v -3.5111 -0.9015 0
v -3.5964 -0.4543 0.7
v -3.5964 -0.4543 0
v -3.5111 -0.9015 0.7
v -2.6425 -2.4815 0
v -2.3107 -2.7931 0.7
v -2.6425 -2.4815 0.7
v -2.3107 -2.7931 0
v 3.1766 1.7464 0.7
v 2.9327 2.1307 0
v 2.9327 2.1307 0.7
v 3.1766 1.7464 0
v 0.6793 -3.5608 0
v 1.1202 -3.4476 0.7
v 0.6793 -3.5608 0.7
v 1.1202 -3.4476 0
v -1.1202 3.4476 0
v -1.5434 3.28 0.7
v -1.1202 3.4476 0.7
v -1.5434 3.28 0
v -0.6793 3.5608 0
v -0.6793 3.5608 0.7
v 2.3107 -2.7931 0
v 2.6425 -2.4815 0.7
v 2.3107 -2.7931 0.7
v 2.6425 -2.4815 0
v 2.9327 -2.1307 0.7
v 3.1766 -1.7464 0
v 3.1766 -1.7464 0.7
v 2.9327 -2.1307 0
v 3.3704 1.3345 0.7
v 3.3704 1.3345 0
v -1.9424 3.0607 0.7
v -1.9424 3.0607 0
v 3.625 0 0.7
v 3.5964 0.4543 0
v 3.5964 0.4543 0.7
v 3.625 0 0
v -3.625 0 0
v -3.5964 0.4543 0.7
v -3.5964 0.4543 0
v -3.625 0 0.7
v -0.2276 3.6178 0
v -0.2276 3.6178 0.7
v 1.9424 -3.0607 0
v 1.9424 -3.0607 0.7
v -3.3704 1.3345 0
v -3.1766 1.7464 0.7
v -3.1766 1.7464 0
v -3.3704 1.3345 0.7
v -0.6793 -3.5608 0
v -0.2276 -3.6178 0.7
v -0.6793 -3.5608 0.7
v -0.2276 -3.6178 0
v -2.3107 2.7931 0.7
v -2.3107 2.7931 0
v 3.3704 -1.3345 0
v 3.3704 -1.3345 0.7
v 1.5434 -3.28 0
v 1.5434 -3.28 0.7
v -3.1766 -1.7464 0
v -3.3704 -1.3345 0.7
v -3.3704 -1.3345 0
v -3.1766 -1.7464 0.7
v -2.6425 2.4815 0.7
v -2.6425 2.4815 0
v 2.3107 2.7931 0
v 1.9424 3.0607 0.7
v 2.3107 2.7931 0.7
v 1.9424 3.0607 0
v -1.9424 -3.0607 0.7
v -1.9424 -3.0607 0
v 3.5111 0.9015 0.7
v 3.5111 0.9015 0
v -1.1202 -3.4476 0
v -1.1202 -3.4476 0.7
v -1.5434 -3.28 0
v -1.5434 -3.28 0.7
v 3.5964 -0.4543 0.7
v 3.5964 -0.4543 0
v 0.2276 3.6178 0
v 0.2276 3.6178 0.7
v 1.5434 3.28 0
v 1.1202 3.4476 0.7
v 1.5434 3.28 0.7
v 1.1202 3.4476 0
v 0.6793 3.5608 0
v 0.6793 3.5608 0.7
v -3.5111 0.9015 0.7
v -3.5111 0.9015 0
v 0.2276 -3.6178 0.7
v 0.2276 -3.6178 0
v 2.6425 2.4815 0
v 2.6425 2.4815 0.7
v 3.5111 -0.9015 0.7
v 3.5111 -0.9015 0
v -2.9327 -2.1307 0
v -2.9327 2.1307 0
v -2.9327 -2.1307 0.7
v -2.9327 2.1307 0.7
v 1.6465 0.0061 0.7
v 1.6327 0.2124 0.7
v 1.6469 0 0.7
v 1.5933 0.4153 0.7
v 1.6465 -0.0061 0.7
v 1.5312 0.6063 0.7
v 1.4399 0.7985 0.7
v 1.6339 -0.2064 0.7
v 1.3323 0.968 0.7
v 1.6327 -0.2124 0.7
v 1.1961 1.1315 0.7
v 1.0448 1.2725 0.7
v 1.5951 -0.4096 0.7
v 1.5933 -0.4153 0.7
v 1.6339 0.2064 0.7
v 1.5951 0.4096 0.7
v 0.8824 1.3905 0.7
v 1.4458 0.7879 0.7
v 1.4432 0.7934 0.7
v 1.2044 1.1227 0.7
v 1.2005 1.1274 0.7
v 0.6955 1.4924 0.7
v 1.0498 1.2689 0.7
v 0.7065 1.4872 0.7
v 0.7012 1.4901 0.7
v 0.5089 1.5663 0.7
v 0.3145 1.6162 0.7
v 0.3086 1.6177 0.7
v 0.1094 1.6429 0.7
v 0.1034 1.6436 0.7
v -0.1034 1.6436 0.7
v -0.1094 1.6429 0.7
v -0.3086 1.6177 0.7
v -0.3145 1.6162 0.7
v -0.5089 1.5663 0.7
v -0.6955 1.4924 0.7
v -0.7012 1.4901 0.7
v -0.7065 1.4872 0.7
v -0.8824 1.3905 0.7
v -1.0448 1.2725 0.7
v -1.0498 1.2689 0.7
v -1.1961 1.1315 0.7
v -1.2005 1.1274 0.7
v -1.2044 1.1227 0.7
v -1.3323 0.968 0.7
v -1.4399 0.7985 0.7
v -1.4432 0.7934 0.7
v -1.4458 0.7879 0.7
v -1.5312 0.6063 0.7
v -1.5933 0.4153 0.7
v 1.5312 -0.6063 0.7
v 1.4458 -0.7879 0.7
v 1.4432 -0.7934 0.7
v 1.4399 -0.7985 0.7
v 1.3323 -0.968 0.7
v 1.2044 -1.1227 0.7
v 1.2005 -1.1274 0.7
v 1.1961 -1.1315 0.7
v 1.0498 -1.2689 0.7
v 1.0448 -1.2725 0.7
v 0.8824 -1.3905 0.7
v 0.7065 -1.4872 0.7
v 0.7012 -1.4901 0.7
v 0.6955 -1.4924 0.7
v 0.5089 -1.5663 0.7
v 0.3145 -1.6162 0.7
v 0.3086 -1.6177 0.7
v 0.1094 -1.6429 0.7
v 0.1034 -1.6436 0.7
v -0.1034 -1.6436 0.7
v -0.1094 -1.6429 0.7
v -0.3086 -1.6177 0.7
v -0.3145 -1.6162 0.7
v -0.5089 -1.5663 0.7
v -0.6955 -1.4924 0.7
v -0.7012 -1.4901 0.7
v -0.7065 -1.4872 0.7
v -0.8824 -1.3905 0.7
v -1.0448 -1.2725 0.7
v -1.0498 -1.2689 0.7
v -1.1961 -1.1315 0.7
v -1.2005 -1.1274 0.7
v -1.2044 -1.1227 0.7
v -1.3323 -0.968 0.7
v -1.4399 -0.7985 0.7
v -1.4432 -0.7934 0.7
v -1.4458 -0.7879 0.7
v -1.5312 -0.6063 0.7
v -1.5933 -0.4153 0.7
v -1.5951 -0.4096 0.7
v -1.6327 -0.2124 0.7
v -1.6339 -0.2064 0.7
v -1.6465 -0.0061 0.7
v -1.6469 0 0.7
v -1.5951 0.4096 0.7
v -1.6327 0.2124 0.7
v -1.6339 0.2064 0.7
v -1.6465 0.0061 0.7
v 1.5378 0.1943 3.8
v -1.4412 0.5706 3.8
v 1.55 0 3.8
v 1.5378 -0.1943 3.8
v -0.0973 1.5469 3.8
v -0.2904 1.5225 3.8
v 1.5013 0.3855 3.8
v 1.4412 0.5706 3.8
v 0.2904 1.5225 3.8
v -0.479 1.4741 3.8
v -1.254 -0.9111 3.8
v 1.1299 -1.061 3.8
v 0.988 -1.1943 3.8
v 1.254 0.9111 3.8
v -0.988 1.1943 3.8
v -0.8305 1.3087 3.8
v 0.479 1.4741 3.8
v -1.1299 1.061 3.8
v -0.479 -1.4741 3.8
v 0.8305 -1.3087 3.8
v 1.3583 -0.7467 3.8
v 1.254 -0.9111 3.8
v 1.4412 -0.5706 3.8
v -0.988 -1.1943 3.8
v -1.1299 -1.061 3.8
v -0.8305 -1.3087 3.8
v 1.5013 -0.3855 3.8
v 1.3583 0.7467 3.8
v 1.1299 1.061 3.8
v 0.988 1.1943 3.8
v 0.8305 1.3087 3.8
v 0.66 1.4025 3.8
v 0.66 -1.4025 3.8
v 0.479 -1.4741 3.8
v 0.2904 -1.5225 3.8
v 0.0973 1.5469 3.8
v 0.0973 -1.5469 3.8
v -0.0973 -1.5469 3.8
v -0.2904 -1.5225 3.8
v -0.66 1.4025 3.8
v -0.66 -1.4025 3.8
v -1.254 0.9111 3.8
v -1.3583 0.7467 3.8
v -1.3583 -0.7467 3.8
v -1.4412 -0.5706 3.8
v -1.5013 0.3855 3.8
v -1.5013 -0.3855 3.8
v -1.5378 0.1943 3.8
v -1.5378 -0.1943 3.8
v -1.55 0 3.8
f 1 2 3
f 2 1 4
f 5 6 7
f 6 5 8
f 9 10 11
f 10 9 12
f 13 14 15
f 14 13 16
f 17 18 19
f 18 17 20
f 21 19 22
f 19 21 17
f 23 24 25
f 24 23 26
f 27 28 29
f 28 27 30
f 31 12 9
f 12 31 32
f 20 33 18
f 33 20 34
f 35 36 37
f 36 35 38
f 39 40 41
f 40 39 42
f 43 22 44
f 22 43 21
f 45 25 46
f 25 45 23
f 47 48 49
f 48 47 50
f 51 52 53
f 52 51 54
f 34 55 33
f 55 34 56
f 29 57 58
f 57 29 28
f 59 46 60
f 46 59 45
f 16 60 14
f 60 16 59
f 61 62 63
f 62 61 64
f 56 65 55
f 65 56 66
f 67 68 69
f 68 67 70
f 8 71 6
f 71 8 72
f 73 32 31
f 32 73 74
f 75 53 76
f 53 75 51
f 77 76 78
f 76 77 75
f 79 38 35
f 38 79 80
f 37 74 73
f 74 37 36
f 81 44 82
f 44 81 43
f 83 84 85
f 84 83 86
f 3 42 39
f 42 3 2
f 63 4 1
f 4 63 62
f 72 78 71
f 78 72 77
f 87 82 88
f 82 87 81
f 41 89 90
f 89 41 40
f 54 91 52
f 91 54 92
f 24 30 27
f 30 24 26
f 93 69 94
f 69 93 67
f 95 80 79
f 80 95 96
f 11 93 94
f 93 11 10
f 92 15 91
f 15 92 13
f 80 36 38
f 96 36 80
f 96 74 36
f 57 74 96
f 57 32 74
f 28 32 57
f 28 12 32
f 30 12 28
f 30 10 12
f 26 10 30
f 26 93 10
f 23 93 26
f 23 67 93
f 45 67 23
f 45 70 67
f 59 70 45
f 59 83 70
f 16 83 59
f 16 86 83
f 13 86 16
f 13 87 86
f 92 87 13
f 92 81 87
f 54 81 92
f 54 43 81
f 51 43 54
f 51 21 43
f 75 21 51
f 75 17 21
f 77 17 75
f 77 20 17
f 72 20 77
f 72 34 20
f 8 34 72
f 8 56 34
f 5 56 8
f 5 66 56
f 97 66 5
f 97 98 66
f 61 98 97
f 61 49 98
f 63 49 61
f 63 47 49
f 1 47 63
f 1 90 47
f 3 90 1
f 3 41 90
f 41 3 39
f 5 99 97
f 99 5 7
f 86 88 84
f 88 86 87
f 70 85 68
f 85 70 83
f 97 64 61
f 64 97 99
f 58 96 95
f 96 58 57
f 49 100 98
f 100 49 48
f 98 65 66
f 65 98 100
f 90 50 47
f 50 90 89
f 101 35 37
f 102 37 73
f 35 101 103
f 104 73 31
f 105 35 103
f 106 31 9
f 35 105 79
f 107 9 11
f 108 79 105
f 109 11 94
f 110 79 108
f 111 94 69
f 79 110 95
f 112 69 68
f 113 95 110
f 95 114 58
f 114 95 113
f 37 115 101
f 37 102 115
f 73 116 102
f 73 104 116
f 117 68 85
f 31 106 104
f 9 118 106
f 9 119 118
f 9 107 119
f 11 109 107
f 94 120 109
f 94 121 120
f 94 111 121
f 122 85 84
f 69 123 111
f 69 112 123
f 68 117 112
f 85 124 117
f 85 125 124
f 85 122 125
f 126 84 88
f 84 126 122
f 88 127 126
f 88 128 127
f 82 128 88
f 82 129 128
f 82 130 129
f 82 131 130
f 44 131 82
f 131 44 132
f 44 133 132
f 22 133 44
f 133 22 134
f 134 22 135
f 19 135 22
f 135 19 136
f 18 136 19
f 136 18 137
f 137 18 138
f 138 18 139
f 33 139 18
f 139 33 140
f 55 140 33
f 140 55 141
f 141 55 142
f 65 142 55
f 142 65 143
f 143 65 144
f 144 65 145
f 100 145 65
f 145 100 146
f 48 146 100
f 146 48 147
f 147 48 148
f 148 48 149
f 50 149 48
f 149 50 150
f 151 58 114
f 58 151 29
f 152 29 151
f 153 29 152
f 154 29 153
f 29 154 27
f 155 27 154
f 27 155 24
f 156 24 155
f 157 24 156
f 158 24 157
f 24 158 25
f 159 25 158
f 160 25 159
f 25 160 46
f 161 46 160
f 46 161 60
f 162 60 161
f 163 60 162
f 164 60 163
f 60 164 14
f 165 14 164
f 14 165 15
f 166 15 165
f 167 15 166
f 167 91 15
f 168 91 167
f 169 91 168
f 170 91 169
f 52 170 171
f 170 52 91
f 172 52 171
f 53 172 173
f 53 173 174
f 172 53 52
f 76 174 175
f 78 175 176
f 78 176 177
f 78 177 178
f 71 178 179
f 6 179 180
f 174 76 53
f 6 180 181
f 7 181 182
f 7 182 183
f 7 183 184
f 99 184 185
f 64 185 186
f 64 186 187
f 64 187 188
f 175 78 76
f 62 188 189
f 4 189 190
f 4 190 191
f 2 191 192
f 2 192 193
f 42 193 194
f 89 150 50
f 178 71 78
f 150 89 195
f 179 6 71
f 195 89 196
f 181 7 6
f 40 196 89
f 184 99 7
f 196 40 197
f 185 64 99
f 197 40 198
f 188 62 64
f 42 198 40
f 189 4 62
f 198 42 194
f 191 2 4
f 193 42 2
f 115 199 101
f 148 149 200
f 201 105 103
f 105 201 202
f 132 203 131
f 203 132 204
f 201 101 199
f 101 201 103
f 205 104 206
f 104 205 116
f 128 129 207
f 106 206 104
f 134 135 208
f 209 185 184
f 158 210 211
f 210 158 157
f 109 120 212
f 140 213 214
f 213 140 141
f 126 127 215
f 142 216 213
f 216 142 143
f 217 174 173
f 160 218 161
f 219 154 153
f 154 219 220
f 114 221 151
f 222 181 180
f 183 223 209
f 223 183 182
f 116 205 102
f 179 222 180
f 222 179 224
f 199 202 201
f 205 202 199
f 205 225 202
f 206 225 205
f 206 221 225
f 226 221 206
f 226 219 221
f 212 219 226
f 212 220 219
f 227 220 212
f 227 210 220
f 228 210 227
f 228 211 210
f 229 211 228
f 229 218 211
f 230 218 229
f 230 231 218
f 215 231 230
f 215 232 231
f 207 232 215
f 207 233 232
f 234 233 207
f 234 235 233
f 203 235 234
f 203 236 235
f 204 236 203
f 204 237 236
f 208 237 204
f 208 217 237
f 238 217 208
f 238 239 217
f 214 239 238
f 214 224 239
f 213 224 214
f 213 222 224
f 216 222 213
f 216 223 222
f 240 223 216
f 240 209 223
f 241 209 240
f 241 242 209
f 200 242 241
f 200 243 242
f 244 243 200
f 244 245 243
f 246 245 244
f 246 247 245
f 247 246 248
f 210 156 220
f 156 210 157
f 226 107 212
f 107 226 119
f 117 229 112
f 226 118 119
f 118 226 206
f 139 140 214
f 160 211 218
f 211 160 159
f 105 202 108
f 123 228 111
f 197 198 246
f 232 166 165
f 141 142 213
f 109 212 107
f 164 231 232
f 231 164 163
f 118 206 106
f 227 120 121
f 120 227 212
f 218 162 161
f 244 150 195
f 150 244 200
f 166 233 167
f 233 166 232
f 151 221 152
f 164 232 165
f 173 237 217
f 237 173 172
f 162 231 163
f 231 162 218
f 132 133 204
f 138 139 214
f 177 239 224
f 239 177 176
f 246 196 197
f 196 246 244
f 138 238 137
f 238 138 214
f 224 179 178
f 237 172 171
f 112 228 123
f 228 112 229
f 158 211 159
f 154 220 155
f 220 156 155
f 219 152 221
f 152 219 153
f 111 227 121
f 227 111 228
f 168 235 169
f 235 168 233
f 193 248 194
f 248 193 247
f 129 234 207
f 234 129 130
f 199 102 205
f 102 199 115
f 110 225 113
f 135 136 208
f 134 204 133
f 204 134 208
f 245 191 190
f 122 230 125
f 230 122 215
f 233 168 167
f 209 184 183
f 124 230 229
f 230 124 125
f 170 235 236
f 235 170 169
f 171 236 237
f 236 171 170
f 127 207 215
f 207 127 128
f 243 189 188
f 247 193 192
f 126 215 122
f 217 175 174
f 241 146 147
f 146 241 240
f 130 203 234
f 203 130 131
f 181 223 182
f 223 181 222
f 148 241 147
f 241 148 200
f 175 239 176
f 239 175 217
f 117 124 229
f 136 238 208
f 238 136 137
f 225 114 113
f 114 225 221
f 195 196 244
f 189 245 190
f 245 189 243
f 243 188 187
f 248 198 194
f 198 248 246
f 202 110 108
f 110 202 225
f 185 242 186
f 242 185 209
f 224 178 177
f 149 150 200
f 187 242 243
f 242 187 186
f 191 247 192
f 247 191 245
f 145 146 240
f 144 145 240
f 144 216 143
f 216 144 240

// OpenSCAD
// file: lib/common.scad
front = [
    149,
    42,
    5
];

rim = [
    146,
    front.y,
    5
];

module components(i, double) {

    count = double ? 2 : 1;

    translate([front.x/2, front.y/2])
    union() {

        if (double) {
            for (x=[0,1])
            translate([(x-0.5)*72, 0])
            controller(i, t=front.z);
        } else {
            controller(i, t=front.z);
        }
        
        translate([0, 0, front.z])
        union() {
            rim(i, rim);
            wings(i, rim);
        }
    }
}

module __build(double=true) {
    difference() {
        cube(front);
        components(false, double=double);
    }
    components(true, double=double);
}

module rim(i, size, t=1, padding_x=3) {
    if (i) {
        cutout = [size.x - (2*t), size.y - (2*t), size.z];
        difference() {
            translate([size.x/-2, size.y/-2]) cube(size);
            translate([cutout.x/-2, cutout.y/-2]) cube(cutout);
        }
    }

    // Bracket
    bracket = [10, t, 0.1];

    for (x=[0,1])
    mirror([x,0])
    translate([(size.x / 2), (size.y/2)])
    union() {
        translate([-bracket.x-padding_x, -bracket.y , size.z])
        hull() {
             cube(bracket);
             translate([bracket.x,0,0]) rotate([0,270,0]) cube(bracket);
        }   


    }
}

module wings(i, rimsize) {

    screw_r = 2.8/2;
    t = 3;
    wing = [t, 30, 52];
    hole_r = 8;

    if (i) {

        for (x=[0,1])
        mirror([x,0])
        translate([(rimsize.x / 2) - wing.x, (rimsize.y/2) - wing.y ])
        union() {

            difference() {
                hull() {
                    // Ensure square bottom:
                    cube([wing.x, wing.y, wing_r]);

                    wing_r = 10;
                    translate([0, wing_r, wing.z - wing_r])
                    rotate([0,90,0]) 
                    minkowski() {
                        cube([wing.z - (2*wing_r), wing.y - (2*wing_r), t/2]);
                        cylinder(r=wing_r, h=t/2, center=false);
                    }

                }
                union() {
                    // Screw holes
                    rotate([0,270])
                    translate([0, wing.y,-t])
                    for (y=[9.5, 9.5+12])
                    translate([47, -y])
                    cylinder(r=screw_r, h=t);

                    // Filament savers
                    rotate([0,270])
                    hull() {
                        translate([rimsize.z, (wing.y/2) - hole_r, -t])
                        cube([1, hole_r*2, t]);

                        translate([33, wing.y/2,-t])
                        cylinder(r=hole_r, h=t);
                    }

                }
            }
        }
    }
}

module controller(i, t) {
    front_h = 0.5; // Minimum thickness of front plate

    // Component height over PCB:
    oled_h      = 2;
    rotary_h    = 4.7;
    button_h    = 2.75;

    mounts = [59, 29];
    cutout = [66, 36, t];

    insert = [cutout.x, cutout.y, front_h + (rotary_h - oled_h)];

    oled_cutout = [32, 16, insert.z];
    oled_cutout_extra = 3;
    oled_initial_inner_h = 0.5;

    rotary_cutout = [12.5, 12.5, insert.z - front_h];
    rotary_r = 3.75;

    button_r = 3;
    button_rim_r = 4;
    button_rim_h = 1.2;

    mount_r = 3;
    mount_padding_x = ((cutout.x - mounts.x) / 2);
    mount_padding_y = ((cutout.y - mounts.y) / 2);
    mount_h = insert.z + oled_h;

    screw_r = 2.8/2;
    screw_h = mount_h - front_h;

    // Designed upside down
    mirror([0, 1])
    if (!i) {

        translate([cutout.x/-2, cutout.y/-2])
        cube(cutout);

    } else {

        difference() {

            union() {
                color([0.5,0.5,0.5])
                translate([insert.x/-2, insert.y/-2])
                cube(insert);

                // Relative to lower
                color([1,0,0])
                for (x=[0,1]) mirror([x,0])
                for (y=[0,1]) mirror([0,y])
                translate([mounts.x/-2, mounts.y/-2])
                union() {
                    cylinder(r=mount_r, h=mount_h);

                    translate([-mount_padding_x, -mount_padding_y])
                    union() {
                        cube([mount_r + mount_padding_x, mount_padding_y, mount_h]);
                        cube([mount_padding_x, mount_r + mount_padding_y, mount_h]);
                    }
                }
            }

            union() {

                for (x=[0,1]) mirror([x,0])
                for (y=[0,1]) mirror([0,y])
                translate([mounts.x/-2, mounts.y/-2, mount_h - screw_h])
                cylinder(r=screw_r, h=screw_h);

                // Relative to lower 
                translate([mounts.x/-2, mounts.y/-2])
                union() {

                    // OLED window
                    translate([2.5, 9])
                    union() {
                        cube(oled_cutout);

                        hull() {
                            translate([0,0,-oled_initial_inner_h])
                            cube(oled_cutout);

                            translate([-oled_cutout_extra, -oled_cutout_extra])
                            cube([
                                oled_cutout.x + (2*oled_cutout_extra),
                                oled_cutout.y + (2*oled_cutout_extra),
                                0.01
                            ]);

                        }
                    }

                    // Rotary                   
                    translate([50.5, 14.5])
                    union() {
                        cylinder(r=rotary_r, h=insert.z);
                        translate([rotary_cutout.x/-2, rotary_cutout.y/-2, front_h])
                        cube(rotary_cutout);

                        // Buttons
                        for (y=[0,1])
                        mirror([0, y])
                        translate([0, 12])
                        union() {
                            cylinder(r=button_r, h=insert.z);

                            translate([0,0, insert.z])
                            rotate([0,180,0])
                            cylinder(r=button_rim_r, h=button_rim_h + (button_h - oled_h) );

                        }
                    }


                }
            }

        }
       
    }
}
// main file
// Birdfeeder-thing
// By Hans Christian Saustrup <hc@saustrup.net>
model_version = "v0.0.1";

use <lib/common.scad>

$fn = $preview ? 0 : 50;

// connector thickness

__build();

module __build() {

    r1 = 3.1 / 2;
    r2 = 3.3 / 2;

    cylinder(r=7.25/2, h=0.7);

    hull() {
    cylinder(r=r1, h=0.5 + 3.3);
    cylinder(r=r2, h=0.5 + 0.1);

    }


}
